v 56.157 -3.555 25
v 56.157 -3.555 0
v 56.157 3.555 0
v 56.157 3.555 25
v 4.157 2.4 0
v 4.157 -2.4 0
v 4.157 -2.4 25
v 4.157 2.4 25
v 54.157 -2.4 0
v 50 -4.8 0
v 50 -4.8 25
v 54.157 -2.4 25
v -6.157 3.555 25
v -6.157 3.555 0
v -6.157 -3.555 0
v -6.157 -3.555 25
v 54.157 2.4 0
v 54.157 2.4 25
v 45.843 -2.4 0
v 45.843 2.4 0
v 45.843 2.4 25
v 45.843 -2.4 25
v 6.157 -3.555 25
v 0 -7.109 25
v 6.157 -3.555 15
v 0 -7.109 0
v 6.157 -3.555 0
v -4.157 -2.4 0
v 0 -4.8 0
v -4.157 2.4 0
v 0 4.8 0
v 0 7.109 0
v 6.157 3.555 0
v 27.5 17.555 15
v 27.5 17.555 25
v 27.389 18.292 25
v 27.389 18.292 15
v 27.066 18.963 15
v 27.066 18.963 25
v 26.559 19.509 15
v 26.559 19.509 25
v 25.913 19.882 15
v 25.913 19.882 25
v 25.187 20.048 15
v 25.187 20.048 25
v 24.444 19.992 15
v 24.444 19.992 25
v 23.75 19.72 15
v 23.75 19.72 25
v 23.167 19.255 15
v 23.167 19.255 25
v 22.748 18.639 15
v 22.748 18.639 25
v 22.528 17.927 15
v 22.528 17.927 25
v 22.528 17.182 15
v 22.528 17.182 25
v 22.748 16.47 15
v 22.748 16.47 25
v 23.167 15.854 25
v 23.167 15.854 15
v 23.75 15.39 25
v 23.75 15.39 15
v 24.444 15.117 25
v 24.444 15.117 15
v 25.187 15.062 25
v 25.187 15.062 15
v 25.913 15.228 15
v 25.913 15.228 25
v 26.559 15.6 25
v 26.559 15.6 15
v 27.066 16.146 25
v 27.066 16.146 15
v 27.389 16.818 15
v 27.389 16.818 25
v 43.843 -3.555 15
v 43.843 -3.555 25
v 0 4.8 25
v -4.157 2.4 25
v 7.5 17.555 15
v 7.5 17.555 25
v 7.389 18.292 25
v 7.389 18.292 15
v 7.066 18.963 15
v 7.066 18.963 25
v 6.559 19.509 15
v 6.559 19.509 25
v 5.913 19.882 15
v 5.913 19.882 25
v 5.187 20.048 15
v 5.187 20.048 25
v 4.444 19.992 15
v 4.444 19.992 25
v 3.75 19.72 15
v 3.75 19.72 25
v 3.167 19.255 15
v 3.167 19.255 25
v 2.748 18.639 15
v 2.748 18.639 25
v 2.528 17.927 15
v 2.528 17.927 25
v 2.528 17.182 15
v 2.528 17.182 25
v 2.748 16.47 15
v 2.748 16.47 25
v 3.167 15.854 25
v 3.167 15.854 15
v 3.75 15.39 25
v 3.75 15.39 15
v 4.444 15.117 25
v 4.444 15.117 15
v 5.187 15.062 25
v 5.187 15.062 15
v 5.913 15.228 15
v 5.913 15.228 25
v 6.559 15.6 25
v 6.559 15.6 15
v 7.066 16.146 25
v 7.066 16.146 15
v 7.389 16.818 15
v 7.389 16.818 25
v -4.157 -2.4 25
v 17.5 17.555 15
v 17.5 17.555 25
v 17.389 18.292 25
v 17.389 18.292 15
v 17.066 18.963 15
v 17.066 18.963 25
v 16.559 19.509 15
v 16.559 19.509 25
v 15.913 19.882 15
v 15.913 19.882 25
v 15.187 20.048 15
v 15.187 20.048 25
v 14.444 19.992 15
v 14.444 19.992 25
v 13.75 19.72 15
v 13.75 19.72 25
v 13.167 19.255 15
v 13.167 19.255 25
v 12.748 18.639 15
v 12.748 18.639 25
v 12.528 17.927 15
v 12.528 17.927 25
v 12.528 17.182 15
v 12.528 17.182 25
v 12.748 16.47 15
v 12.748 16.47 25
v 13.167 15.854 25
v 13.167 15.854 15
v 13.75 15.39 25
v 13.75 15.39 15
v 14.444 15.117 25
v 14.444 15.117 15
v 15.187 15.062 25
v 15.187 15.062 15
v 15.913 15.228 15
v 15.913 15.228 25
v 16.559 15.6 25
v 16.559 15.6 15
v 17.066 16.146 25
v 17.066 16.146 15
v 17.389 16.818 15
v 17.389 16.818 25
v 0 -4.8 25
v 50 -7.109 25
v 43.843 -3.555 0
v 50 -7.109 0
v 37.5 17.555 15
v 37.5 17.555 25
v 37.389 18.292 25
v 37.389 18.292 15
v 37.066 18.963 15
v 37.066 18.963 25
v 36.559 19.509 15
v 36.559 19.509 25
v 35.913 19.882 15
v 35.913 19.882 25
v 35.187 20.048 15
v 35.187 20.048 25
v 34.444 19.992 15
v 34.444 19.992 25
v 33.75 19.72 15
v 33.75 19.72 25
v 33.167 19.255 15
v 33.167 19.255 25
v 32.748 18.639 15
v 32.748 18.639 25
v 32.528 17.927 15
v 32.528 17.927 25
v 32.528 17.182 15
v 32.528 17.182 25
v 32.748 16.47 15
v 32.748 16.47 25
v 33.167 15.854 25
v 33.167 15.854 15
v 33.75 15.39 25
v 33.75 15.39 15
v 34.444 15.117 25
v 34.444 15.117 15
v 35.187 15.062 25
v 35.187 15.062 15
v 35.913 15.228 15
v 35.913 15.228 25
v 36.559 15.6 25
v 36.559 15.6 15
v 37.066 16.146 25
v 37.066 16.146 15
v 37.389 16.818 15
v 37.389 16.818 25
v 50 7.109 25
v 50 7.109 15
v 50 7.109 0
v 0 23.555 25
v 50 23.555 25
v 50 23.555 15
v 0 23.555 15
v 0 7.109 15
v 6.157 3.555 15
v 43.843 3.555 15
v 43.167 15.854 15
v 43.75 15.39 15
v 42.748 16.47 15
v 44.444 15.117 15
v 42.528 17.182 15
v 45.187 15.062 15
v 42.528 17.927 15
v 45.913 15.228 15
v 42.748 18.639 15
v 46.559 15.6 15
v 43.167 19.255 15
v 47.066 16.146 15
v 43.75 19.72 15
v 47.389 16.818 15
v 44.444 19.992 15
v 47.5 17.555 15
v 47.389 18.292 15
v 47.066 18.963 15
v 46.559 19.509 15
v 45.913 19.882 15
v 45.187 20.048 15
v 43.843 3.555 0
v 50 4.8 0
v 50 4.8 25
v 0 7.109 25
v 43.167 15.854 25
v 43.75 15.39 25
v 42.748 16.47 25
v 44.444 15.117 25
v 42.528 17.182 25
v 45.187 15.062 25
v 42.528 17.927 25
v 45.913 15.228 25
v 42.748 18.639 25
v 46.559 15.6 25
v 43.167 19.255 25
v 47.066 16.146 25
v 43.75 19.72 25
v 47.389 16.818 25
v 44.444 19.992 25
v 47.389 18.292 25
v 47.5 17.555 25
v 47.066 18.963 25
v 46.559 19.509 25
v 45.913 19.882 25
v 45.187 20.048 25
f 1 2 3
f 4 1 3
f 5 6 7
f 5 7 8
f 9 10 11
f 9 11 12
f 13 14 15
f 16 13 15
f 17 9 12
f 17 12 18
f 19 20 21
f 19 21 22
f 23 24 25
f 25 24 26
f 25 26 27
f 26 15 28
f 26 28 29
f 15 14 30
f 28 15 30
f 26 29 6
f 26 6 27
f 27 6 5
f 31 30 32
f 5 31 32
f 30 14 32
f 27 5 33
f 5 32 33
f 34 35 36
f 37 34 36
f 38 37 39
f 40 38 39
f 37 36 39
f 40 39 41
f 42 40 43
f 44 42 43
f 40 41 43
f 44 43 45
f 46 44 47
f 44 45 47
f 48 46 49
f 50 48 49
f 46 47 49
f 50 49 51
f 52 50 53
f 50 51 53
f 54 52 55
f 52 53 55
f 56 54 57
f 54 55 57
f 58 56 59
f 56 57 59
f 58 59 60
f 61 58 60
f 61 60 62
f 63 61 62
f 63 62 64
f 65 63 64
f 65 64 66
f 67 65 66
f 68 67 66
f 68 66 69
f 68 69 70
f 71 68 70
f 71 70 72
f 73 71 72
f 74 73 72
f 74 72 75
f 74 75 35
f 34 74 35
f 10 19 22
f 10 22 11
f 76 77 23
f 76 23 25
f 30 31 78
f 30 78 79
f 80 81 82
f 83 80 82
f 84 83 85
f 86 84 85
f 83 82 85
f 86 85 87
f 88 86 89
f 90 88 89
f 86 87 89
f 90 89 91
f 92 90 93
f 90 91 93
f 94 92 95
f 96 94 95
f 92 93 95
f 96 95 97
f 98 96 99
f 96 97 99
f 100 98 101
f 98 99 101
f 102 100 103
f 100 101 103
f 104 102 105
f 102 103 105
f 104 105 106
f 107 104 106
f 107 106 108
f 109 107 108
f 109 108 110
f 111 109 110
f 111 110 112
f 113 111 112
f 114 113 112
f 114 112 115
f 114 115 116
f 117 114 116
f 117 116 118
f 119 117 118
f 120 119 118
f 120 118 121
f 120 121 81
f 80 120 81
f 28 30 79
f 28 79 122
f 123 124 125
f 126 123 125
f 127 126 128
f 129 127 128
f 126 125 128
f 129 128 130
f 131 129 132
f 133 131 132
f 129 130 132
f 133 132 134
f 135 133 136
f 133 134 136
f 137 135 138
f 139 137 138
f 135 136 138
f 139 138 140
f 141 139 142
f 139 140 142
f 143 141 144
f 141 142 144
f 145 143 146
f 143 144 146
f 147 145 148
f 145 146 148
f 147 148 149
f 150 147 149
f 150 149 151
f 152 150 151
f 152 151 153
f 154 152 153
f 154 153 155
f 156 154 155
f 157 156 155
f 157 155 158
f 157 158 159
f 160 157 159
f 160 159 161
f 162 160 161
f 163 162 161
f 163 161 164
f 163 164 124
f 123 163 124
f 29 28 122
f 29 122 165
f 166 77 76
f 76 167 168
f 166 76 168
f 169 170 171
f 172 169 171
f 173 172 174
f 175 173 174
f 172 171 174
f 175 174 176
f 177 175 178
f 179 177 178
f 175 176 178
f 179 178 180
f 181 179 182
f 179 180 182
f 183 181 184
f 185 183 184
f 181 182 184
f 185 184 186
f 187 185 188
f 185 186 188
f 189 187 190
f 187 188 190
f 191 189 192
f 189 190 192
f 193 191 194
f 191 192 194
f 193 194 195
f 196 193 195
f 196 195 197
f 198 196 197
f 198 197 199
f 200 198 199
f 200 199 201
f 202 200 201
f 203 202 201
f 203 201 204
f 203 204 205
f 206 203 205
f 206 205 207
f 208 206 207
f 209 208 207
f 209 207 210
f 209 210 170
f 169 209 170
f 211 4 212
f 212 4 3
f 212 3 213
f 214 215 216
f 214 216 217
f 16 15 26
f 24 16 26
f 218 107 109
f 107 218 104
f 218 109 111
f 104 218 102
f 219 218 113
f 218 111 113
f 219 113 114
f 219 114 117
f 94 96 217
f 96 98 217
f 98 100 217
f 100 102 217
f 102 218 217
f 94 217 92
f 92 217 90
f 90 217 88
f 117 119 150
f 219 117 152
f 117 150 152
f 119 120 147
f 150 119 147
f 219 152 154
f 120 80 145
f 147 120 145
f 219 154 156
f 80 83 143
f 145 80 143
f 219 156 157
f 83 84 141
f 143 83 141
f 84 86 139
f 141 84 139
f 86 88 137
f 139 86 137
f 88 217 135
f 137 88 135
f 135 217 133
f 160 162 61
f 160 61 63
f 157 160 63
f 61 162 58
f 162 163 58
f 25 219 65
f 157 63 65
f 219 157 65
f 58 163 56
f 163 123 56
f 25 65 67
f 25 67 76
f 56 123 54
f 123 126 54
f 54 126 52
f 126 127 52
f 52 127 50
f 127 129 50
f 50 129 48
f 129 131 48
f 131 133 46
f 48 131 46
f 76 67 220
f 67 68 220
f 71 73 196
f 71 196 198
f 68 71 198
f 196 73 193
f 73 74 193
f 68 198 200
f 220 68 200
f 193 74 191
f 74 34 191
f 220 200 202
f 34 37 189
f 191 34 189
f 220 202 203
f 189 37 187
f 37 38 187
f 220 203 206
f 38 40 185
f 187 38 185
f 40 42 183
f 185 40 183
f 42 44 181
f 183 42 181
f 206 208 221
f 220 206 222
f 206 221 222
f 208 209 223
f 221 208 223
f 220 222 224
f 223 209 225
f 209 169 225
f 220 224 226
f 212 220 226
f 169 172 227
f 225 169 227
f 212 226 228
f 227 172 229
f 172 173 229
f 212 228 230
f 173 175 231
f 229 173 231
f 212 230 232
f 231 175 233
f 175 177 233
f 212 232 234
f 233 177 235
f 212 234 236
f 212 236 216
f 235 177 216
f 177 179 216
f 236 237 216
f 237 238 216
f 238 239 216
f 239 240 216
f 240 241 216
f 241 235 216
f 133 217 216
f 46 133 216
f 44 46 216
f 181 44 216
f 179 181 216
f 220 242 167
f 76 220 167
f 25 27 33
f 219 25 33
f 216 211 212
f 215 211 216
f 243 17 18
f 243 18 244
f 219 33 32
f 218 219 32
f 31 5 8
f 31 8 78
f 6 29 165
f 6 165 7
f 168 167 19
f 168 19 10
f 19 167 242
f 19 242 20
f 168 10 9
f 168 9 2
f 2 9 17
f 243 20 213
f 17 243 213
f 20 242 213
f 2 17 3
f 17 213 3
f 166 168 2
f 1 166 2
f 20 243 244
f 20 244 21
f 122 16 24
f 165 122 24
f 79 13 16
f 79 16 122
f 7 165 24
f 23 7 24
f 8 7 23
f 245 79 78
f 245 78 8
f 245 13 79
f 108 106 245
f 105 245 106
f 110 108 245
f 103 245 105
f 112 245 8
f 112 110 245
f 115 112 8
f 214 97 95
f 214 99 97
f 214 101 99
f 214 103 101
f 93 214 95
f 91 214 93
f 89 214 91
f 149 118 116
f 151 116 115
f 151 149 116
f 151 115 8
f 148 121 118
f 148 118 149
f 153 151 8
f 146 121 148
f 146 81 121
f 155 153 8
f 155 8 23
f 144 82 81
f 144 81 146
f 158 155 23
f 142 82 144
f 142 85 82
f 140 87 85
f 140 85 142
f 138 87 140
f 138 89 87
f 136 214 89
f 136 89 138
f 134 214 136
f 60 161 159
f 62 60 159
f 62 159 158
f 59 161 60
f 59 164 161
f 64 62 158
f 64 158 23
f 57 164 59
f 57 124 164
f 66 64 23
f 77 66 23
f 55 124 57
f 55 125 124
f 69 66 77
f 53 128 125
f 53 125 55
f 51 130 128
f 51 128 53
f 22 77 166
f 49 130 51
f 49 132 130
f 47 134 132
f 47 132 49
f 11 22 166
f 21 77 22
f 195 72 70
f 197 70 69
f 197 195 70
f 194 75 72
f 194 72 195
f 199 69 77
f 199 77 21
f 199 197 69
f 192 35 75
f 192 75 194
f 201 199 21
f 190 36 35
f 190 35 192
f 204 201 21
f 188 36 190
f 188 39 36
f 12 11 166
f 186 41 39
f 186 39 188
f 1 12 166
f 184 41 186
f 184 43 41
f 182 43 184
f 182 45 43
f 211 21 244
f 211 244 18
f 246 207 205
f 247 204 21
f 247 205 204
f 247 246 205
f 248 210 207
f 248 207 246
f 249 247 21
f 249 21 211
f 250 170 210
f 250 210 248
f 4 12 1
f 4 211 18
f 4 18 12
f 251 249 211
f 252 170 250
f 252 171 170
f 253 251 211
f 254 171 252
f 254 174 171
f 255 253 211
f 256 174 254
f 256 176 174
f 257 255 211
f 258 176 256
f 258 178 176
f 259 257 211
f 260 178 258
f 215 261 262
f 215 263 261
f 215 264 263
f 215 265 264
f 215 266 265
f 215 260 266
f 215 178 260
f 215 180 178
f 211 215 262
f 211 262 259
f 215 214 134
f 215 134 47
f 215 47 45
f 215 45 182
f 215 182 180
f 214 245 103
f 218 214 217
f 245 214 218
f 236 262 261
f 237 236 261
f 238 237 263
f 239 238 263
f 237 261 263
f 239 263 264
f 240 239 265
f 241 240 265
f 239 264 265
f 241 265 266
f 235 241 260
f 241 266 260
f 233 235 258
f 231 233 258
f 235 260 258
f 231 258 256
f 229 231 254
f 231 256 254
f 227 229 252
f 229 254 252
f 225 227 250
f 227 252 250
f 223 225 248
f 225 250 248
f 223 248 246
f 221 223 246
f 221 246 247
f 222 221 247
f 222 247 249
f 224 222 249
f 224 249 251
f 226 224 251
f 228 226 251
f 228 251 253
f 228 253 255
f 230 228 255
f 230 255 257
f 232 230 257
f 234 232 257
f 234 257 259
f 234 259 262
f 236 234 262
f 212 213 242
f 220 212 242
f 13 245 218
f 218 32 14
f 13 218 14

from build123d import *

# Parameters (mm, degrees)
BOSS_EXTRUDE1_DEPTH   = 25
BOSS_EXTRUDE1_2_DEPTH = 25
BOSS_EXTRUDE2_REACH   = 58.352
SKETCH2_W             = 10
SKETCH2_H             = 7.109401076
BOSS_EXTRUDE3_DEPTH   = 10
SKETCH4_R             = 2.5
CUT_EXTRUDE1_DEPTH    = 66.828745993


with BuildPart() as part:
    # Sketch1 → Boss-Extrude1 (new body)
    with BuildSketch(Plane.XY):
        Polygon((-6.156921938, -3.554700538), (0, -7.109401077), (6.156921938, -3.554700538), (6.156921938, 3.554700538), (0, 7.109401077), (-6.156921938, 3.554700538), align=None)
        Polygon((-4.156921938, 2.4), (-4.156921938, -2.4), (0, -4.8), (4.156921938, -2.4), (4.156921938, 2.4), (0, 4.8), align=None, mode=Mode.SUBTRACT)
    extrude(amount=BOSS_EXTRUDE1_DEPTH)


with BuildPart() as body_2:
    # Sketch1 → Boss-Extrude1 2 (new body)
    with BuildSketch(Plane.XY):
        Polygon((43.843078062, -3.554700538), (50, -7.109401077), (56.156921938, -3.554700538), (56.156921938, 3.554700538), (50, 7.109401077), (43.843078062, 3.554700538), align=None)
        Polygon((45.843078062, -2.4), (50, -4.8), (54.156921938, -2.4), (54.156921938, 2.4), (50, 4.8), (45.843078062, 2.4), align=None, mode=Mode.SUBTRACT)
    extrude(amount=BOSS_EXTRUDE1_2_DEPTH)

    # Boss-Extrude2: up to this face of the body (flat: up to its plane)
    boss_extrude2_end = Plane(body_2.part.faces().sort_by_distance((43.843078062, 0, 12.5))[0])
    # Sketch2 → Boss-Extrude2 (add, up to the picked face)
    with BuildSketch(Plane(origin=(6.156921938, 0, 0), x_dir=(0, 0, -1), z_dir=(1, 0, 0)), mode=Mode.PRIVATE) as boss_extrude2_sk1:
        with Locations((-20, 0)):
            Rectangle(SKETCH2_W, SKETCH2_H)
    boss_extrude2_tool1 = split(extrude(boss_extrude2_sk1.sketch, amount=BOSS_EXTRUDE2_REACH, mode=Mode.PRIVATE), bisect_by=boss_extrude2_end, keep=Keep.BOTH, mode=Mode.PRIVATE)

    add(part.part)  # Boss-Extrude2 merges part
    add(boss_extrude2_tool1.solids().sort_by(Axis((6.156922, 0, 20), (1, 0, 0)))[0])

    # Sketch3 → Boss-Extrude3 (add)
    with BuildSketch(Plane.XY.offset(25)):
        Polygon((50, 7.109401077), (50, 23.554700538), (0, 23.554700538), (0, 7.109401077), (6.156921938, 3.554700538), (43.843078062, 3.554700538), align=None)
    extrude(amount=-BOSS_EXTRUDE3_DEPTH)

    # Sketch4 → Cut-Extrude1 (cut, through all)
    with BuildSketch(Plane.XY.offset(25)):
        with Locations((25, 17.554700538)):
            Circle(SKETCH4_R)
        with Locations((35, 17.554700538)):
            Circle(SKETCH4_R)
        with Locations((45, 17.554700538)):
            Circle(SKETCH4_R)
        with Locations((15, 17.554700538)):
            Circle(SKETCH4_R)
        with Locations((5, 17.554700538)):
            Circle(SKETCH4_R)
    extrude(amount=-CUT_EXTRUDE1_DEPTH, mode=Mode.SUBTRACT)


solid = body_2.part
